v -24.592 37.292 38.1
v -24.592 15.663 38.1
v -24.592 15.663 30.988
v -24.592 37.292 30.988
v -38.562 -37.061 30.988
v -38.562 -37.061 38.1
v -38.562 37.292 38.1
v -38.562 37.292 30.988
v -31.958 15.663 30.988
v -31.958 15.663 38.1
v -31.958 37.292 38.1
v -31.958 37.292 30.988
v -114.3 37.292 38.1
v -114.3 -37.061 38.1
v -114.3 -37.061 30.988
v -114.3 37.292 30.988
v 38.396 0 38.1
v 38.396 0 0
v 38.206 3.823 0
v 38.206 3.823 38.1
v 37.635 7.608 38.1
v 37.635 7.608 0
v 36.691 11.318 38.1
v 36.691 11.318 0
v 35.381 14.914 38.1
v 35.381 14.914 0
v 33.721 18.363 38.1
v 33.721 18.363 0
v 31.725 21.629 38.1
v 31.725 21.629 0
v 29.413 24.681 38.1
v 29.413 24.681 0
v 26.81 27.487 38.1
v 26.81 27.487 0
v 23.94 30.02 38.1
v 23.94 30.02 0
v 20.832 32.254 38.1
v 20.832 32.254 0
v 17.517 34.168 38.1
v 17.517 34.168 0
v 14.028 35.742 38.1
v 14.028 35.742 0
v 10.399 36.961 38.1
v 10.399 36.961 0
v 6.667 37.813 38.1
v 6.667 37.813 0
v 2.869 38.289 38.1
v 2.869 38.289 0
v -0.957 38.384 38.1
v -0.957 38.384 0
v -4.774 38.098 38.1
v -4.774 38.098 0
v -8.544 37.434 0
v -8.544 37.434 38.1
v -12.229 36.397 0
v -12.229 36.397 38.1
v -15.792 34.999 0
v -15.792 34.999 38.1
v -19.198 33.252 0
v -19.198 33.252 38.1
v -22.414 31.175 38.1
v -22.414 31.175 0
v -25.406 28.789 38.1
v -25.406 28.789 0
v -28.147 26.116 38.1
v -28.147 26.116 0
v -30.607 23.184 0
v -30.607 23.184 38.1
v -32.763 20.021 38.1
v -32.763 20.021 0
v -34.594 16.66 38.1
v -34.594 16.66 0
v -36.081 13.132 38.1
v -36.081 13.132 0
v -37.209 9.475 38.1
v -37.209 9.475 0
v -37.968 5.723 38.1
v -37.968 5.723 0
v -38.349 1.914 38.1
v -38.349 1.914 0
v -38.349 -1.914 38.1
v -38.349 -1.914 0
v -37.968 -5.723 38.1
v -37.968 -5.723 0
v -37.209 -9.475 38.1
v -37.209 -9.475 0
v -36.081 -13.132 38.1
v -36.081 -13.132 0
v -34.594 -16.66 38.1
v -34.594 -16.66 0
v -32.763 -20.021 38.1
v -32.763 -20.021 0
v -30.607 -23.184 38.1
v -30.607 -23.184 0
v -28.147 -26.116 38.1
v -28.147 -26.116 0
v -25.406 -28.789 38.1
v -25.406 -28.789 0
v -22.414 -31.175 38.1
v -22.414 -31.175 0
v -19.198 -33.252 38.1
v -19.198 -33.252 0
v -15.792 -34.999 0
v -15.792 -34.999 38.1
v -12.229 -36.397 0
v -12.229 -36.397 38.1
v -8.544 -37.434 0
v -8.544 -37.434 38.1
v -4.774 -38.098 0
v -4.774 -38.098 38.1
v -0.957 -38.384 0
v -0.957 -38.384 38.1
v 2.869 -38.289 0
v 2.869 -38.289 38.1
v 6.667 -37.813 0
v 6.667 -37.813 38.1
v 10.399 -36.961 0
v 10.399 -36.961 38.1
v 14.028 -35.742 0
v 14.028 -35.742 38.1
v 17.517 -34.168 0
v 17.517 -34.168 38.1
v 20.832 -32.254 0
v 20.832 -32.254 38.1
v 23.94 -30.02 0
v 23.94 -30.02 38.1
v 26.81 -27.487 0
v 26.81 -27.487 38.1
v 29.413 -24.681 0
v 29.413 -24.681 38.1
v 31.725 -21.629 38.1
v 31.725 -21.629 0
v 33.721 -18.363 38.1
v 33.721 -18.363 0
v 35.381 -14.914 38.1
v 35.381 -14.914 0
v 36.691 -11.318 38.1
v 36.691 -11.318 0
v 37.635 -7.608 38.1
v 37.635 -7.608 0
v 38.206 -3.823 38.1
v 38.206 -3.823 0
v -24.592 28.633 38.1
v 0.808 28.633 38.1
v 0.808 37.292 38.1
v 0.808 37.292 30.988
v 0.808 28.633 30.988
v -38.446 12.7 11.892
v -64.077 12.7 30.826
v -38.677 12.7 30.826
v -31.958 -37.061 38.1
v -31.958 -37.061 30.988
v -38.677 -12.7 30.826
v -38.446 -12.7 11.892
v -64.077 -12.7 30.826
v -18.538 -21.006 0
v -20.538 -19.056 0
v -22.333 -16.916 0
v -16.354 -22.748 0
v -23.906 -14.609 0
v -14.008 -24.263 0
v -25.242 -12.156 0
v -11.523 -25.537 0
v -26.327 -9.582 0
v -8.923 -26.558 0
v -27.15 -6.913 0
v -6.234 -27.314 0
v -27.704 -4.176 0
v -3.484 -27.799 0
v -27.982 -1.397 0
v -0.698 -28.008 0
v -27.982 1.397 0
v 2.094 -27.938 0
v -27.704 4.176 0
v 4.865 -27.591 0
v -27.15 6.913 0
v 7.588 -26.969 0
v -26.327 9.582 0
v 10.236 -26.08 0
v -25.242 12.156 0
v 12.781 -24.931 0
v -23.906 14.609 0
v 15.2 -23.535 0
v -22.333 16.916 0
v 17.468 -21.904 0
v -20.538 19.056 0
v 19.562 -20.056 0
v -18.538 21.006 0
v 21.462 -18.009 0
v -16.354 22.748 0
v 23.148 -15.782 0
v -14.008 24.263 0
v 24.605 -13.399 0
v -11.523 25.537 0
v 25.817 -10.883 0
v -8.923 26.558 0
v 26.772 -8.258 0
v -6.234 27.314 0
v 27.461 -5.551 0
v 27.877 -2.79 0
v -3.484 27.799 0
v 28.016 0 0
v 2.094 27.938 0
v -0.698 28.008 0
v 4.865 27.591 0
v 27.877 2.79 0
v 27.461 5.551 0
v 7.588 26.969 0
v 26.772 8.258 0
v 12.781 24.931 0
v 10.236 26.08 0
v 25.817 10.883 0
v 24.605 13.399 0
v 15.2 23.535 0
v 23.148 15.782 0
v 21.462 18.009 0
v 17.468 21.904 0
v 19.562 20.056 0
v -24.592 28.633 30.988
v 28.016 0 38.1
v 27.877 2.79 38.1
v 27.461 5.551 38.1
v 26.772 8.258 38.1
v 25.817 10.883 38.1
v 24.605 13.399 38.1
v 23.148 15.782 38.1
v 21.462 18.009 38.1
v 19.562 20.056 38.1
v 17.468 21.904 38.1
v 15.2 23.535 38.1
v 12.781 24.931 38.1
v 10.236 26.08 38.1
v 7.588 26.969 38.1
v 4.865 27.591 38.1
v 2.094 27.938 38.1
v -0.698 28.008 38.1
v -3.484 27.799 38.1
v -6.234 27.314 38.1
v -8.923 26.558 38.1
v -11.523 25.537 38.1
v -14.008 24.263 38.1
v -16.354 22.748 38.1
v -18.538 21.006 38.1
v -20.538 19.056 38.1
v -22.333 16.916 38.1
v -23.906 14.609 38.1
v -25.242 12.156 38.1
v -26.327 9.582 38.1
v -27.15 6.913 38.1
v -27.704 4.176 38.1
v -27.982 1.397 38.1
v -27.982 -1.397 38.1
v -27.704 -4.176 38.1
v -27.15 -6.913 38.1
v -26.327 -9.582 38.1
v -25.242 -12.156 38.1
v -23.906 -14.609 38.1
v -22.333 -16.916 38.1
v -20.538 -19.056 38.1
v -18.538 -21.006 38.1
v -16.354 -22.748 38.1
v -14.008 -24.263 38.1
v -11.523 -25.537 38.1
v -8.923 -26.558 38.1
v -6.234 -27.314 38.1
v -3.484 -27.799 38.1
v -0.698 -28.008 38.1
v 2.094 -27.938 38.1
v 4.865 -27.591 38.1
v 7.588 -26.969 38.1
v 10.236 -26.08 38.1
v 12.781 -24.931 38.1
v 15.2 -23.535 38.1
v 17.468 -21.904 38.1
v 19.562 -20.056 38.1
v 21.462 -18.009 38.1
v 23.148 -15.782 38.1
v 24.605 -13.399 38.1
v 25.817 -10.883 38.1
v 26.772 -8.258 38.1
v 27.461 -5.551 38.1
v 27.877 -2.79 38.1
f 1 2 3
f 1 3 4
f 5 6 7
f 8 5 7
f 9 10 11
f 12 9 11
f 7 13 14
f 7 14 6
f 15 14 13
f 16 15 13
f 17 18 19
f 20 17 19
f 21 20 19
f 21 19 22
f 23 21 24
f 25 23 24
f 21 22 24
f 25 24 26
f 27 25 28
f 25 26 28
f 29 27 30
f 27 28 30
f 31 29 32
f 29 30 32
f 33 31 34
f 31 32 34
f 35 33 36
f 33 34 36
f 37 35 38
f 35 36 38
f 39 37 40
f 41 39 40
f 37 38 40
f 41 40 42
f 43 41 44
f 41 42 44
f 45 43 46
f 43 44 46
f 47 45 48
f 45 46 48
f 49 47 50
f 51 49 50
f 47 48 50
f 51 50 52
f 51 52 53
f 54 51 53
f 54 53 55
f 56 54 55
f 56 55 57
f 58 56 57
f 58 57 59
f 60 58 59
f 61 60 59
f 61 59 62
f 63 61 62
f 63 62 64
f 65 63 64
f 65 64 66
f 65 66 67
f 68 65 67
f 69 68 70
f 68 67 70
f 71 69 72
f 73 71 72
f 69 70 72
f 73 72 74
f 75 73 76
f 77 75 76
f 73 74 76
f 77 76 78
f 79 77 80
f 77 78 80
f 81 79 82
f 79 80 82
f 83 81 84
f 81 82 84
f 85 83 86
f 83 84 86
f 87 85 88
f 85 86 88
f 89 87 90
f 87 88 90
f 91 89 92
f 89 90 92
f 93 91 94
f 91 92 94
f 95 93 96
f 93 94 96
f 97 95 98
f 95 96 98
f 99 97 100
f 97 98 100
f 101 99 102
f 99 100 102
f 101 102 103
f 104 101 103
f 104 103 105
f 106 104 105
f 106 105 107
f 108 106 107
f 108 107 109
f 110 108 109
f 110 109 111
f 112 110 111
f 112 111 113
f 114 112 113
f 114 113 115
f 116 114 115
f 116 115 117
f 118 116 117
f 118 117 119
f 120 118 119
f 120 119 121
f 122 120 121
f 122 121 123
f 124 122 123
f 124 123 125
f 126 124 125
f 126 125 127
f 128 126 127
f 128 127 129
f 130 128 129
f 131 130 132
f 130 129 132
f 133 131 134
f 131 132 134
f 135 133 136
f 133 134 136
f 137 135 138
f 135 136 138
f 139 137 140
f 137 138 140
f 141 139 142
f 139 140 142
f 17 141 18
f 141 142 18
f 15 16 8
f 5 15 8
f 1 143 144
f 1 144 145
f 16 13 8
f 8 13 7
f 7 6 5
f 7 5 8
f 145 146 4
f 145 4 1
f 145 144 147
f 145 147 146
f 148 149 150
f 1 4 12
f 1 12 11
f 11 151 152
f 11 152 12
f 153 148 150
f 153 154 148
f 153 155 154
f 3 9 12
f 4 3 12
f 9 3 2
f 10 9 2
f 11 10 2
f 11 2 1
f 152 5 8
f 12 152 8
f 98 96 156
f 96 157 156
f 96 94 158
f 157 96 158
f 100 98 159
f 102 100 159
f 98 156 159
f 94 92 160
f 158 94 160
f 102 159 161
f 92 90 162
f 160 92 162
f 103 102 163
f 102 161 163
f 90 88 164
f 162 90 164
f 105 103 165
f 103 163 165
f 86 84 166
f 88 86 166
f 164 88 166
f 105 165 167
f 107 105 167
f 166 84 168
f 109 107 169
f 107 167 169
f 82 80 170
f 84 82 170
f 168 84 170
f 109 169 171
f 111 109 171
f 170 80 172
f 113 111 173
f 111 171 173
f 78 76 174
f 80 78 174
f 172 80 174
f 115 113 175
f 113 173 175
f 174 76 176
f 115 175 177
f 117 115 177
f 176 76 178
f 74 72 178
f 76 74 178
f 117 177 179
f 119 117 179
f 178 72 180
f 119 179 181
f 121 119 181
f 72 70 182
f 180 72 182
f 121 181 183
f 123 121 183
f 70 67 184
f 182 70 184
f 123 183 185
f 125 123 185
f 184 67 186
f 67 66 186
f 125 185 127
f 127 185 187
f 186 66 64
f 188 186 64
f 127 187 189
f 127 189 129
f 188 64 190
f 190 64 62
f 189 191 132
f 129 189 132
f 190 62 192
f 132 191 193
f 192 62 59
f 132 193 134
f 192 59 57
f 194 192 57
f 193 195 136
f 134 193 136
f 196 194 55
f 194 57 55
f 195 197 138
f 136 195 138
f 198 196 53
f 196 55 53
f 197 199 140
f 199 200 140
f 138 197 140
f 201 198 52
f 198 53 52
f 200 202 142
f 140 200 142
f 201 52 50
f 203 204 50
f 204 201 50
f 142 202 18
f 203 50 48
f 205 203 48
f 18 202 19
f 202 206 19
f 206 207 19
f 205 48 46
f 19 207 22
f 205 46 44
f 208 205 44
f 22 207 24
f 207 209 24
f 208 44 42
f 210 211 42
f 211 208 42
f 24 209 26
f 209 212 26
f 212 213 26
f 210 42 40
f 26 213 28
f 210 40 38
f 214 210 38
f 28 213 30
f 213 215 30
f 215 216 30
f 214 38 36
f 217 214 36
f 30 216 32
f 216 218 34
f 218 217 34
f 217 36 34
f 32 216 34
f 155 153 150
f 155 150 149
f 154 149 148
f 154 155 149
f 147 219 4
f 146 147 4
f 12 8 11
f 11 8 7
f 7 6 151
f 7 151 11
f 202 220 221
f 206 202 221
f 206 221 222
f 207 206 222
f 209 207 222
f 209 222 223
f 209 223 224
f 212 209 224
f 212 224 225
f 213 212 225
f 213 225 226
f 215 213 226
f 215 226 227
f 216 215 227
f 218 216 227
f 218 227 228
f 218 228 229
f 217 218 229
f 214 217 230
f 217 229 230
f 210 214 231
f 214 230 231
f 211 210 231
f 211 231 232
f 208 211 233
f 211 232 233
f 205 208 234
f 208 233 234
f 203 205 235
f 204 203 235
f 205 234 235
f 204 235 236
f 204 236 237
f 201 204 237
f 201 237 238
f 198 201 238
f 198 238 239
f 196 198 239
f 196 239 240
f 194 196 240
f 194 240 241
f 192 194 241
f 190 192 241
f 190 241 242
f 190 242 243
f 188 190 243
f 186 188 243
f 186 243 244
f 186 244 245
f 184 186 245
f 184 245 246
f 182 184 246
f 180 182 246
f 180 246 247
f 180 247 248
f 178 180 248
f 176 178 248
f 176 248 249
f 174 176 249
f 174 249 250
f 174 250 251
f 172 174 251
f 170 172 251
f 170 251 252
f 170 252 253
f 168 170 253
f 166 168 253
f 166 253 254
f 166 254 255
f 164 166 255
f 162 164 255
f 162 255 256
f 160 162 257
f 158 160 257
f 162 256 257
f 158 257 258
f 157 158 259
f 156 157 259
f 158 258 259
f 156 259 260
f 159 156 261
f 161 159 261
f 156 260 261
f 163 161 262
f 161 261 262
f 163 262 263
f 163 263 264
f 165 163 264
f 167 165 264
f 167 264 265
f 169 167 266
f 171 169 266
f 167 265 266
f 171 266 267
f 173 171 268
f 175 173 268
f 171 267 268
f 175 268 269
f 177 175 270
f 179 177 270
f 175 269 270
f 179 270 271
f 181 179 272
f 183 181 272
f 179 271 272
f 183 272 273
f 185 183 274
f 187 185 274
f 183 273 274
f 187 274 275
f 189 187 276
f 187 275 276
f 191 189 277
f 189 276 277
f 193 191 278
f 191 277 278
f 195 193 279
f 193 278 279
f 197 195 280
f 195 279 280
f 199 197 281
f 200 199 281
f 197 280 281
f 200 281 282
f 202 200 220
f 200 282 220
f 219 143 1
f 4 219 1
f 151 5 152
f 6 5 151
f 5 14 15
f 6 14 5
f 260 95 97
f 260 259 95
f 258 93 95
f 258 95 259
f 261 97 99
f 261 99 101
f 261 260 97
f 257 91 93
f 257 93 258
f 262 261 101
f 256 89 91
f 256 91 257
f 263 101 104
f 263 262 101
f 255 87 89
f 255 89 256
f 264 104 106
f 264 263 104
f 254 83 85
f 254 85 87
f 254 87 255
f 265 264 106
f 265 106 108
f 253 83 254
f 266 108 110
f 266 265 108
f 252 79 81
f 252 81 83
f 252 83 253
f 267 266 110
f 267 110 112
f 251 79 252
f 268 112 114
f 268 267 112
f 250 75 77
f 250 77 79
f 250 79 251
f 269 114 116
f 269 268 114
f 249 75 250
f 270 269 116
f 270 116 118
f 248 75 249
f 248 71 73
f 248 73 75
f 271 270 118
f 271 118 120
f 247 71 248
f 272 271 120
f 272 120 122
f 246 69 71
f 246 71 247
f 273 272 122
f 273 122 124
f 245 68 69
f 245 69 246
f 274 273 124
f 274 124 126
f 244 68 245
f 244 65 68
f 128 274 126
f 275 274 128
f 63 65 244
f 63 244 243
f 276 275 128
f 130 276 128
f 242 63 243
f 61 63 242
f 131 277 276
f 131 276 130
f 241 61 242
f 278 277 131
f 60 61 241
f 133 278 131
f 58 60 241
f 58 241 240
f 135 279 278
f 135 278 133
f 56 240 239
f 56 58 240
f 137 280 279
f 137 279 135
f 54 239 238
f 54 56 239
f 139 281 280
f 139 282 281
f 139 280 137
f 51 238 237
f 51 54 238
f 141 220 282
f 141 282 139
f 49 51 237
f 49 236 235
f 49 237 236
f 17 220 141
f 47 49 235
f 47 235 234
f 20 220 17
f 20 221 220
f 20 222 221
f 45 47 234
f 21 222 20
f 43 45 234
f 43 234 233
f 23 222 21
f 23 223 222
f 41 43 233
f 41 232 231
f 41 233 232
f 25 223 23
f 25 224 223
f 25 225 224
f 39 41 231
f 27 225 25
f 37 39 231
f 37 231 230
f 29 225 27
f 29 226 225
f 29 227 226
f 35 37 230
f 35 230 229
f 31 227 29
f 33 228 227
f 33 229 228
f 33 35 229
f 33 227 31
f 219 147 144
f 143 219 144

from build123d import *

# Parameters (mm, degrees)
F0_R      = 38.396404
F1_DEPTH  = 38.1
F3_W      = 75.738188
F3_H      = 74.352726
F4_DEPTH  = 7.112
F2_R      = 28.01647
F5_DEPTH  = 75.438
F7_DEPTH  = 12.7
F8_W      = 74.352726
F8_H      = 7.112
F9_DEPTH  = 6.604
F10_W     = 21.62872
F10_H     = 7.112
F11_DEPTH = 7.366
F12_W     = 8.659089
F12_H     = 7.112
F13_DEPTH = 25.4


with BuildPart() as f1:
    # F0 (on Top) → F1 (new body)
    with BuildSketch(Plane.XY):
        Circle(F0_R)
    extrude(amount=F1_DEPTH)

    # F2 (on face) → F5 (cut)
    with BuildSketch(Plane.XY.offset(38.1)):
        Circle(F2_R)
    extrude(amount=-F5_DEPTH, mode=Mode.SUBTRACT)


with BuildPart() as f4:
    # F3 (on face) → F4 (new body)
    with BuildSketch(Plane.XY.offset(38.1)):
        with Locations((-76.430911, 0.115454)):
            Rectangle(F3_W, F3_H)
    extrude(amount=-F4_DEPTH)


with BuildPart() as f7:
    # F6 (on Front) → F7 (new body, symmetric)
    with BuildSketch(Plane.XZ):
        Polygon((-38.446367, 11.891818), (-38.677275, 30.826364), (-64.077273, 30.826364), align=None)
    extrude(amount=F7_DEPTH, both=True)


with BuildPart() as f9:
    # F8 (on face) → F9 (new body)
    with BuildSketch(Plane.YZ.offset(-38.561817)):
        with Locations((0.115454, 34.544)):
            Rectangle(F8_W, F8_H)
    extrude(amount=F9_DEPTH)


with BuildPart() as f11:
    # F10 (on face) → F11 (new body)
    with BuildSketch(Plane.YZ.offset(-31.957817)):
        with Locations((26.477457, 34.544)):
            Rectangle(F10_W, F10_H)
    extrude(amount=F11_DEPTH)


with BuildPart() as f13:
    # F12 (on face) → F13 (new body)
    with BuildSketch(Plane.YZ.offset(-24.591817)):
        with Locations((32.962272, 34.544)):
            Rectangle(F12_W, F12_H)
    extrude(amount=F13_DEPTH)


solid = Compound([f1.part, f4.part, f7.part, f9.part, f11.part, f13.part])
